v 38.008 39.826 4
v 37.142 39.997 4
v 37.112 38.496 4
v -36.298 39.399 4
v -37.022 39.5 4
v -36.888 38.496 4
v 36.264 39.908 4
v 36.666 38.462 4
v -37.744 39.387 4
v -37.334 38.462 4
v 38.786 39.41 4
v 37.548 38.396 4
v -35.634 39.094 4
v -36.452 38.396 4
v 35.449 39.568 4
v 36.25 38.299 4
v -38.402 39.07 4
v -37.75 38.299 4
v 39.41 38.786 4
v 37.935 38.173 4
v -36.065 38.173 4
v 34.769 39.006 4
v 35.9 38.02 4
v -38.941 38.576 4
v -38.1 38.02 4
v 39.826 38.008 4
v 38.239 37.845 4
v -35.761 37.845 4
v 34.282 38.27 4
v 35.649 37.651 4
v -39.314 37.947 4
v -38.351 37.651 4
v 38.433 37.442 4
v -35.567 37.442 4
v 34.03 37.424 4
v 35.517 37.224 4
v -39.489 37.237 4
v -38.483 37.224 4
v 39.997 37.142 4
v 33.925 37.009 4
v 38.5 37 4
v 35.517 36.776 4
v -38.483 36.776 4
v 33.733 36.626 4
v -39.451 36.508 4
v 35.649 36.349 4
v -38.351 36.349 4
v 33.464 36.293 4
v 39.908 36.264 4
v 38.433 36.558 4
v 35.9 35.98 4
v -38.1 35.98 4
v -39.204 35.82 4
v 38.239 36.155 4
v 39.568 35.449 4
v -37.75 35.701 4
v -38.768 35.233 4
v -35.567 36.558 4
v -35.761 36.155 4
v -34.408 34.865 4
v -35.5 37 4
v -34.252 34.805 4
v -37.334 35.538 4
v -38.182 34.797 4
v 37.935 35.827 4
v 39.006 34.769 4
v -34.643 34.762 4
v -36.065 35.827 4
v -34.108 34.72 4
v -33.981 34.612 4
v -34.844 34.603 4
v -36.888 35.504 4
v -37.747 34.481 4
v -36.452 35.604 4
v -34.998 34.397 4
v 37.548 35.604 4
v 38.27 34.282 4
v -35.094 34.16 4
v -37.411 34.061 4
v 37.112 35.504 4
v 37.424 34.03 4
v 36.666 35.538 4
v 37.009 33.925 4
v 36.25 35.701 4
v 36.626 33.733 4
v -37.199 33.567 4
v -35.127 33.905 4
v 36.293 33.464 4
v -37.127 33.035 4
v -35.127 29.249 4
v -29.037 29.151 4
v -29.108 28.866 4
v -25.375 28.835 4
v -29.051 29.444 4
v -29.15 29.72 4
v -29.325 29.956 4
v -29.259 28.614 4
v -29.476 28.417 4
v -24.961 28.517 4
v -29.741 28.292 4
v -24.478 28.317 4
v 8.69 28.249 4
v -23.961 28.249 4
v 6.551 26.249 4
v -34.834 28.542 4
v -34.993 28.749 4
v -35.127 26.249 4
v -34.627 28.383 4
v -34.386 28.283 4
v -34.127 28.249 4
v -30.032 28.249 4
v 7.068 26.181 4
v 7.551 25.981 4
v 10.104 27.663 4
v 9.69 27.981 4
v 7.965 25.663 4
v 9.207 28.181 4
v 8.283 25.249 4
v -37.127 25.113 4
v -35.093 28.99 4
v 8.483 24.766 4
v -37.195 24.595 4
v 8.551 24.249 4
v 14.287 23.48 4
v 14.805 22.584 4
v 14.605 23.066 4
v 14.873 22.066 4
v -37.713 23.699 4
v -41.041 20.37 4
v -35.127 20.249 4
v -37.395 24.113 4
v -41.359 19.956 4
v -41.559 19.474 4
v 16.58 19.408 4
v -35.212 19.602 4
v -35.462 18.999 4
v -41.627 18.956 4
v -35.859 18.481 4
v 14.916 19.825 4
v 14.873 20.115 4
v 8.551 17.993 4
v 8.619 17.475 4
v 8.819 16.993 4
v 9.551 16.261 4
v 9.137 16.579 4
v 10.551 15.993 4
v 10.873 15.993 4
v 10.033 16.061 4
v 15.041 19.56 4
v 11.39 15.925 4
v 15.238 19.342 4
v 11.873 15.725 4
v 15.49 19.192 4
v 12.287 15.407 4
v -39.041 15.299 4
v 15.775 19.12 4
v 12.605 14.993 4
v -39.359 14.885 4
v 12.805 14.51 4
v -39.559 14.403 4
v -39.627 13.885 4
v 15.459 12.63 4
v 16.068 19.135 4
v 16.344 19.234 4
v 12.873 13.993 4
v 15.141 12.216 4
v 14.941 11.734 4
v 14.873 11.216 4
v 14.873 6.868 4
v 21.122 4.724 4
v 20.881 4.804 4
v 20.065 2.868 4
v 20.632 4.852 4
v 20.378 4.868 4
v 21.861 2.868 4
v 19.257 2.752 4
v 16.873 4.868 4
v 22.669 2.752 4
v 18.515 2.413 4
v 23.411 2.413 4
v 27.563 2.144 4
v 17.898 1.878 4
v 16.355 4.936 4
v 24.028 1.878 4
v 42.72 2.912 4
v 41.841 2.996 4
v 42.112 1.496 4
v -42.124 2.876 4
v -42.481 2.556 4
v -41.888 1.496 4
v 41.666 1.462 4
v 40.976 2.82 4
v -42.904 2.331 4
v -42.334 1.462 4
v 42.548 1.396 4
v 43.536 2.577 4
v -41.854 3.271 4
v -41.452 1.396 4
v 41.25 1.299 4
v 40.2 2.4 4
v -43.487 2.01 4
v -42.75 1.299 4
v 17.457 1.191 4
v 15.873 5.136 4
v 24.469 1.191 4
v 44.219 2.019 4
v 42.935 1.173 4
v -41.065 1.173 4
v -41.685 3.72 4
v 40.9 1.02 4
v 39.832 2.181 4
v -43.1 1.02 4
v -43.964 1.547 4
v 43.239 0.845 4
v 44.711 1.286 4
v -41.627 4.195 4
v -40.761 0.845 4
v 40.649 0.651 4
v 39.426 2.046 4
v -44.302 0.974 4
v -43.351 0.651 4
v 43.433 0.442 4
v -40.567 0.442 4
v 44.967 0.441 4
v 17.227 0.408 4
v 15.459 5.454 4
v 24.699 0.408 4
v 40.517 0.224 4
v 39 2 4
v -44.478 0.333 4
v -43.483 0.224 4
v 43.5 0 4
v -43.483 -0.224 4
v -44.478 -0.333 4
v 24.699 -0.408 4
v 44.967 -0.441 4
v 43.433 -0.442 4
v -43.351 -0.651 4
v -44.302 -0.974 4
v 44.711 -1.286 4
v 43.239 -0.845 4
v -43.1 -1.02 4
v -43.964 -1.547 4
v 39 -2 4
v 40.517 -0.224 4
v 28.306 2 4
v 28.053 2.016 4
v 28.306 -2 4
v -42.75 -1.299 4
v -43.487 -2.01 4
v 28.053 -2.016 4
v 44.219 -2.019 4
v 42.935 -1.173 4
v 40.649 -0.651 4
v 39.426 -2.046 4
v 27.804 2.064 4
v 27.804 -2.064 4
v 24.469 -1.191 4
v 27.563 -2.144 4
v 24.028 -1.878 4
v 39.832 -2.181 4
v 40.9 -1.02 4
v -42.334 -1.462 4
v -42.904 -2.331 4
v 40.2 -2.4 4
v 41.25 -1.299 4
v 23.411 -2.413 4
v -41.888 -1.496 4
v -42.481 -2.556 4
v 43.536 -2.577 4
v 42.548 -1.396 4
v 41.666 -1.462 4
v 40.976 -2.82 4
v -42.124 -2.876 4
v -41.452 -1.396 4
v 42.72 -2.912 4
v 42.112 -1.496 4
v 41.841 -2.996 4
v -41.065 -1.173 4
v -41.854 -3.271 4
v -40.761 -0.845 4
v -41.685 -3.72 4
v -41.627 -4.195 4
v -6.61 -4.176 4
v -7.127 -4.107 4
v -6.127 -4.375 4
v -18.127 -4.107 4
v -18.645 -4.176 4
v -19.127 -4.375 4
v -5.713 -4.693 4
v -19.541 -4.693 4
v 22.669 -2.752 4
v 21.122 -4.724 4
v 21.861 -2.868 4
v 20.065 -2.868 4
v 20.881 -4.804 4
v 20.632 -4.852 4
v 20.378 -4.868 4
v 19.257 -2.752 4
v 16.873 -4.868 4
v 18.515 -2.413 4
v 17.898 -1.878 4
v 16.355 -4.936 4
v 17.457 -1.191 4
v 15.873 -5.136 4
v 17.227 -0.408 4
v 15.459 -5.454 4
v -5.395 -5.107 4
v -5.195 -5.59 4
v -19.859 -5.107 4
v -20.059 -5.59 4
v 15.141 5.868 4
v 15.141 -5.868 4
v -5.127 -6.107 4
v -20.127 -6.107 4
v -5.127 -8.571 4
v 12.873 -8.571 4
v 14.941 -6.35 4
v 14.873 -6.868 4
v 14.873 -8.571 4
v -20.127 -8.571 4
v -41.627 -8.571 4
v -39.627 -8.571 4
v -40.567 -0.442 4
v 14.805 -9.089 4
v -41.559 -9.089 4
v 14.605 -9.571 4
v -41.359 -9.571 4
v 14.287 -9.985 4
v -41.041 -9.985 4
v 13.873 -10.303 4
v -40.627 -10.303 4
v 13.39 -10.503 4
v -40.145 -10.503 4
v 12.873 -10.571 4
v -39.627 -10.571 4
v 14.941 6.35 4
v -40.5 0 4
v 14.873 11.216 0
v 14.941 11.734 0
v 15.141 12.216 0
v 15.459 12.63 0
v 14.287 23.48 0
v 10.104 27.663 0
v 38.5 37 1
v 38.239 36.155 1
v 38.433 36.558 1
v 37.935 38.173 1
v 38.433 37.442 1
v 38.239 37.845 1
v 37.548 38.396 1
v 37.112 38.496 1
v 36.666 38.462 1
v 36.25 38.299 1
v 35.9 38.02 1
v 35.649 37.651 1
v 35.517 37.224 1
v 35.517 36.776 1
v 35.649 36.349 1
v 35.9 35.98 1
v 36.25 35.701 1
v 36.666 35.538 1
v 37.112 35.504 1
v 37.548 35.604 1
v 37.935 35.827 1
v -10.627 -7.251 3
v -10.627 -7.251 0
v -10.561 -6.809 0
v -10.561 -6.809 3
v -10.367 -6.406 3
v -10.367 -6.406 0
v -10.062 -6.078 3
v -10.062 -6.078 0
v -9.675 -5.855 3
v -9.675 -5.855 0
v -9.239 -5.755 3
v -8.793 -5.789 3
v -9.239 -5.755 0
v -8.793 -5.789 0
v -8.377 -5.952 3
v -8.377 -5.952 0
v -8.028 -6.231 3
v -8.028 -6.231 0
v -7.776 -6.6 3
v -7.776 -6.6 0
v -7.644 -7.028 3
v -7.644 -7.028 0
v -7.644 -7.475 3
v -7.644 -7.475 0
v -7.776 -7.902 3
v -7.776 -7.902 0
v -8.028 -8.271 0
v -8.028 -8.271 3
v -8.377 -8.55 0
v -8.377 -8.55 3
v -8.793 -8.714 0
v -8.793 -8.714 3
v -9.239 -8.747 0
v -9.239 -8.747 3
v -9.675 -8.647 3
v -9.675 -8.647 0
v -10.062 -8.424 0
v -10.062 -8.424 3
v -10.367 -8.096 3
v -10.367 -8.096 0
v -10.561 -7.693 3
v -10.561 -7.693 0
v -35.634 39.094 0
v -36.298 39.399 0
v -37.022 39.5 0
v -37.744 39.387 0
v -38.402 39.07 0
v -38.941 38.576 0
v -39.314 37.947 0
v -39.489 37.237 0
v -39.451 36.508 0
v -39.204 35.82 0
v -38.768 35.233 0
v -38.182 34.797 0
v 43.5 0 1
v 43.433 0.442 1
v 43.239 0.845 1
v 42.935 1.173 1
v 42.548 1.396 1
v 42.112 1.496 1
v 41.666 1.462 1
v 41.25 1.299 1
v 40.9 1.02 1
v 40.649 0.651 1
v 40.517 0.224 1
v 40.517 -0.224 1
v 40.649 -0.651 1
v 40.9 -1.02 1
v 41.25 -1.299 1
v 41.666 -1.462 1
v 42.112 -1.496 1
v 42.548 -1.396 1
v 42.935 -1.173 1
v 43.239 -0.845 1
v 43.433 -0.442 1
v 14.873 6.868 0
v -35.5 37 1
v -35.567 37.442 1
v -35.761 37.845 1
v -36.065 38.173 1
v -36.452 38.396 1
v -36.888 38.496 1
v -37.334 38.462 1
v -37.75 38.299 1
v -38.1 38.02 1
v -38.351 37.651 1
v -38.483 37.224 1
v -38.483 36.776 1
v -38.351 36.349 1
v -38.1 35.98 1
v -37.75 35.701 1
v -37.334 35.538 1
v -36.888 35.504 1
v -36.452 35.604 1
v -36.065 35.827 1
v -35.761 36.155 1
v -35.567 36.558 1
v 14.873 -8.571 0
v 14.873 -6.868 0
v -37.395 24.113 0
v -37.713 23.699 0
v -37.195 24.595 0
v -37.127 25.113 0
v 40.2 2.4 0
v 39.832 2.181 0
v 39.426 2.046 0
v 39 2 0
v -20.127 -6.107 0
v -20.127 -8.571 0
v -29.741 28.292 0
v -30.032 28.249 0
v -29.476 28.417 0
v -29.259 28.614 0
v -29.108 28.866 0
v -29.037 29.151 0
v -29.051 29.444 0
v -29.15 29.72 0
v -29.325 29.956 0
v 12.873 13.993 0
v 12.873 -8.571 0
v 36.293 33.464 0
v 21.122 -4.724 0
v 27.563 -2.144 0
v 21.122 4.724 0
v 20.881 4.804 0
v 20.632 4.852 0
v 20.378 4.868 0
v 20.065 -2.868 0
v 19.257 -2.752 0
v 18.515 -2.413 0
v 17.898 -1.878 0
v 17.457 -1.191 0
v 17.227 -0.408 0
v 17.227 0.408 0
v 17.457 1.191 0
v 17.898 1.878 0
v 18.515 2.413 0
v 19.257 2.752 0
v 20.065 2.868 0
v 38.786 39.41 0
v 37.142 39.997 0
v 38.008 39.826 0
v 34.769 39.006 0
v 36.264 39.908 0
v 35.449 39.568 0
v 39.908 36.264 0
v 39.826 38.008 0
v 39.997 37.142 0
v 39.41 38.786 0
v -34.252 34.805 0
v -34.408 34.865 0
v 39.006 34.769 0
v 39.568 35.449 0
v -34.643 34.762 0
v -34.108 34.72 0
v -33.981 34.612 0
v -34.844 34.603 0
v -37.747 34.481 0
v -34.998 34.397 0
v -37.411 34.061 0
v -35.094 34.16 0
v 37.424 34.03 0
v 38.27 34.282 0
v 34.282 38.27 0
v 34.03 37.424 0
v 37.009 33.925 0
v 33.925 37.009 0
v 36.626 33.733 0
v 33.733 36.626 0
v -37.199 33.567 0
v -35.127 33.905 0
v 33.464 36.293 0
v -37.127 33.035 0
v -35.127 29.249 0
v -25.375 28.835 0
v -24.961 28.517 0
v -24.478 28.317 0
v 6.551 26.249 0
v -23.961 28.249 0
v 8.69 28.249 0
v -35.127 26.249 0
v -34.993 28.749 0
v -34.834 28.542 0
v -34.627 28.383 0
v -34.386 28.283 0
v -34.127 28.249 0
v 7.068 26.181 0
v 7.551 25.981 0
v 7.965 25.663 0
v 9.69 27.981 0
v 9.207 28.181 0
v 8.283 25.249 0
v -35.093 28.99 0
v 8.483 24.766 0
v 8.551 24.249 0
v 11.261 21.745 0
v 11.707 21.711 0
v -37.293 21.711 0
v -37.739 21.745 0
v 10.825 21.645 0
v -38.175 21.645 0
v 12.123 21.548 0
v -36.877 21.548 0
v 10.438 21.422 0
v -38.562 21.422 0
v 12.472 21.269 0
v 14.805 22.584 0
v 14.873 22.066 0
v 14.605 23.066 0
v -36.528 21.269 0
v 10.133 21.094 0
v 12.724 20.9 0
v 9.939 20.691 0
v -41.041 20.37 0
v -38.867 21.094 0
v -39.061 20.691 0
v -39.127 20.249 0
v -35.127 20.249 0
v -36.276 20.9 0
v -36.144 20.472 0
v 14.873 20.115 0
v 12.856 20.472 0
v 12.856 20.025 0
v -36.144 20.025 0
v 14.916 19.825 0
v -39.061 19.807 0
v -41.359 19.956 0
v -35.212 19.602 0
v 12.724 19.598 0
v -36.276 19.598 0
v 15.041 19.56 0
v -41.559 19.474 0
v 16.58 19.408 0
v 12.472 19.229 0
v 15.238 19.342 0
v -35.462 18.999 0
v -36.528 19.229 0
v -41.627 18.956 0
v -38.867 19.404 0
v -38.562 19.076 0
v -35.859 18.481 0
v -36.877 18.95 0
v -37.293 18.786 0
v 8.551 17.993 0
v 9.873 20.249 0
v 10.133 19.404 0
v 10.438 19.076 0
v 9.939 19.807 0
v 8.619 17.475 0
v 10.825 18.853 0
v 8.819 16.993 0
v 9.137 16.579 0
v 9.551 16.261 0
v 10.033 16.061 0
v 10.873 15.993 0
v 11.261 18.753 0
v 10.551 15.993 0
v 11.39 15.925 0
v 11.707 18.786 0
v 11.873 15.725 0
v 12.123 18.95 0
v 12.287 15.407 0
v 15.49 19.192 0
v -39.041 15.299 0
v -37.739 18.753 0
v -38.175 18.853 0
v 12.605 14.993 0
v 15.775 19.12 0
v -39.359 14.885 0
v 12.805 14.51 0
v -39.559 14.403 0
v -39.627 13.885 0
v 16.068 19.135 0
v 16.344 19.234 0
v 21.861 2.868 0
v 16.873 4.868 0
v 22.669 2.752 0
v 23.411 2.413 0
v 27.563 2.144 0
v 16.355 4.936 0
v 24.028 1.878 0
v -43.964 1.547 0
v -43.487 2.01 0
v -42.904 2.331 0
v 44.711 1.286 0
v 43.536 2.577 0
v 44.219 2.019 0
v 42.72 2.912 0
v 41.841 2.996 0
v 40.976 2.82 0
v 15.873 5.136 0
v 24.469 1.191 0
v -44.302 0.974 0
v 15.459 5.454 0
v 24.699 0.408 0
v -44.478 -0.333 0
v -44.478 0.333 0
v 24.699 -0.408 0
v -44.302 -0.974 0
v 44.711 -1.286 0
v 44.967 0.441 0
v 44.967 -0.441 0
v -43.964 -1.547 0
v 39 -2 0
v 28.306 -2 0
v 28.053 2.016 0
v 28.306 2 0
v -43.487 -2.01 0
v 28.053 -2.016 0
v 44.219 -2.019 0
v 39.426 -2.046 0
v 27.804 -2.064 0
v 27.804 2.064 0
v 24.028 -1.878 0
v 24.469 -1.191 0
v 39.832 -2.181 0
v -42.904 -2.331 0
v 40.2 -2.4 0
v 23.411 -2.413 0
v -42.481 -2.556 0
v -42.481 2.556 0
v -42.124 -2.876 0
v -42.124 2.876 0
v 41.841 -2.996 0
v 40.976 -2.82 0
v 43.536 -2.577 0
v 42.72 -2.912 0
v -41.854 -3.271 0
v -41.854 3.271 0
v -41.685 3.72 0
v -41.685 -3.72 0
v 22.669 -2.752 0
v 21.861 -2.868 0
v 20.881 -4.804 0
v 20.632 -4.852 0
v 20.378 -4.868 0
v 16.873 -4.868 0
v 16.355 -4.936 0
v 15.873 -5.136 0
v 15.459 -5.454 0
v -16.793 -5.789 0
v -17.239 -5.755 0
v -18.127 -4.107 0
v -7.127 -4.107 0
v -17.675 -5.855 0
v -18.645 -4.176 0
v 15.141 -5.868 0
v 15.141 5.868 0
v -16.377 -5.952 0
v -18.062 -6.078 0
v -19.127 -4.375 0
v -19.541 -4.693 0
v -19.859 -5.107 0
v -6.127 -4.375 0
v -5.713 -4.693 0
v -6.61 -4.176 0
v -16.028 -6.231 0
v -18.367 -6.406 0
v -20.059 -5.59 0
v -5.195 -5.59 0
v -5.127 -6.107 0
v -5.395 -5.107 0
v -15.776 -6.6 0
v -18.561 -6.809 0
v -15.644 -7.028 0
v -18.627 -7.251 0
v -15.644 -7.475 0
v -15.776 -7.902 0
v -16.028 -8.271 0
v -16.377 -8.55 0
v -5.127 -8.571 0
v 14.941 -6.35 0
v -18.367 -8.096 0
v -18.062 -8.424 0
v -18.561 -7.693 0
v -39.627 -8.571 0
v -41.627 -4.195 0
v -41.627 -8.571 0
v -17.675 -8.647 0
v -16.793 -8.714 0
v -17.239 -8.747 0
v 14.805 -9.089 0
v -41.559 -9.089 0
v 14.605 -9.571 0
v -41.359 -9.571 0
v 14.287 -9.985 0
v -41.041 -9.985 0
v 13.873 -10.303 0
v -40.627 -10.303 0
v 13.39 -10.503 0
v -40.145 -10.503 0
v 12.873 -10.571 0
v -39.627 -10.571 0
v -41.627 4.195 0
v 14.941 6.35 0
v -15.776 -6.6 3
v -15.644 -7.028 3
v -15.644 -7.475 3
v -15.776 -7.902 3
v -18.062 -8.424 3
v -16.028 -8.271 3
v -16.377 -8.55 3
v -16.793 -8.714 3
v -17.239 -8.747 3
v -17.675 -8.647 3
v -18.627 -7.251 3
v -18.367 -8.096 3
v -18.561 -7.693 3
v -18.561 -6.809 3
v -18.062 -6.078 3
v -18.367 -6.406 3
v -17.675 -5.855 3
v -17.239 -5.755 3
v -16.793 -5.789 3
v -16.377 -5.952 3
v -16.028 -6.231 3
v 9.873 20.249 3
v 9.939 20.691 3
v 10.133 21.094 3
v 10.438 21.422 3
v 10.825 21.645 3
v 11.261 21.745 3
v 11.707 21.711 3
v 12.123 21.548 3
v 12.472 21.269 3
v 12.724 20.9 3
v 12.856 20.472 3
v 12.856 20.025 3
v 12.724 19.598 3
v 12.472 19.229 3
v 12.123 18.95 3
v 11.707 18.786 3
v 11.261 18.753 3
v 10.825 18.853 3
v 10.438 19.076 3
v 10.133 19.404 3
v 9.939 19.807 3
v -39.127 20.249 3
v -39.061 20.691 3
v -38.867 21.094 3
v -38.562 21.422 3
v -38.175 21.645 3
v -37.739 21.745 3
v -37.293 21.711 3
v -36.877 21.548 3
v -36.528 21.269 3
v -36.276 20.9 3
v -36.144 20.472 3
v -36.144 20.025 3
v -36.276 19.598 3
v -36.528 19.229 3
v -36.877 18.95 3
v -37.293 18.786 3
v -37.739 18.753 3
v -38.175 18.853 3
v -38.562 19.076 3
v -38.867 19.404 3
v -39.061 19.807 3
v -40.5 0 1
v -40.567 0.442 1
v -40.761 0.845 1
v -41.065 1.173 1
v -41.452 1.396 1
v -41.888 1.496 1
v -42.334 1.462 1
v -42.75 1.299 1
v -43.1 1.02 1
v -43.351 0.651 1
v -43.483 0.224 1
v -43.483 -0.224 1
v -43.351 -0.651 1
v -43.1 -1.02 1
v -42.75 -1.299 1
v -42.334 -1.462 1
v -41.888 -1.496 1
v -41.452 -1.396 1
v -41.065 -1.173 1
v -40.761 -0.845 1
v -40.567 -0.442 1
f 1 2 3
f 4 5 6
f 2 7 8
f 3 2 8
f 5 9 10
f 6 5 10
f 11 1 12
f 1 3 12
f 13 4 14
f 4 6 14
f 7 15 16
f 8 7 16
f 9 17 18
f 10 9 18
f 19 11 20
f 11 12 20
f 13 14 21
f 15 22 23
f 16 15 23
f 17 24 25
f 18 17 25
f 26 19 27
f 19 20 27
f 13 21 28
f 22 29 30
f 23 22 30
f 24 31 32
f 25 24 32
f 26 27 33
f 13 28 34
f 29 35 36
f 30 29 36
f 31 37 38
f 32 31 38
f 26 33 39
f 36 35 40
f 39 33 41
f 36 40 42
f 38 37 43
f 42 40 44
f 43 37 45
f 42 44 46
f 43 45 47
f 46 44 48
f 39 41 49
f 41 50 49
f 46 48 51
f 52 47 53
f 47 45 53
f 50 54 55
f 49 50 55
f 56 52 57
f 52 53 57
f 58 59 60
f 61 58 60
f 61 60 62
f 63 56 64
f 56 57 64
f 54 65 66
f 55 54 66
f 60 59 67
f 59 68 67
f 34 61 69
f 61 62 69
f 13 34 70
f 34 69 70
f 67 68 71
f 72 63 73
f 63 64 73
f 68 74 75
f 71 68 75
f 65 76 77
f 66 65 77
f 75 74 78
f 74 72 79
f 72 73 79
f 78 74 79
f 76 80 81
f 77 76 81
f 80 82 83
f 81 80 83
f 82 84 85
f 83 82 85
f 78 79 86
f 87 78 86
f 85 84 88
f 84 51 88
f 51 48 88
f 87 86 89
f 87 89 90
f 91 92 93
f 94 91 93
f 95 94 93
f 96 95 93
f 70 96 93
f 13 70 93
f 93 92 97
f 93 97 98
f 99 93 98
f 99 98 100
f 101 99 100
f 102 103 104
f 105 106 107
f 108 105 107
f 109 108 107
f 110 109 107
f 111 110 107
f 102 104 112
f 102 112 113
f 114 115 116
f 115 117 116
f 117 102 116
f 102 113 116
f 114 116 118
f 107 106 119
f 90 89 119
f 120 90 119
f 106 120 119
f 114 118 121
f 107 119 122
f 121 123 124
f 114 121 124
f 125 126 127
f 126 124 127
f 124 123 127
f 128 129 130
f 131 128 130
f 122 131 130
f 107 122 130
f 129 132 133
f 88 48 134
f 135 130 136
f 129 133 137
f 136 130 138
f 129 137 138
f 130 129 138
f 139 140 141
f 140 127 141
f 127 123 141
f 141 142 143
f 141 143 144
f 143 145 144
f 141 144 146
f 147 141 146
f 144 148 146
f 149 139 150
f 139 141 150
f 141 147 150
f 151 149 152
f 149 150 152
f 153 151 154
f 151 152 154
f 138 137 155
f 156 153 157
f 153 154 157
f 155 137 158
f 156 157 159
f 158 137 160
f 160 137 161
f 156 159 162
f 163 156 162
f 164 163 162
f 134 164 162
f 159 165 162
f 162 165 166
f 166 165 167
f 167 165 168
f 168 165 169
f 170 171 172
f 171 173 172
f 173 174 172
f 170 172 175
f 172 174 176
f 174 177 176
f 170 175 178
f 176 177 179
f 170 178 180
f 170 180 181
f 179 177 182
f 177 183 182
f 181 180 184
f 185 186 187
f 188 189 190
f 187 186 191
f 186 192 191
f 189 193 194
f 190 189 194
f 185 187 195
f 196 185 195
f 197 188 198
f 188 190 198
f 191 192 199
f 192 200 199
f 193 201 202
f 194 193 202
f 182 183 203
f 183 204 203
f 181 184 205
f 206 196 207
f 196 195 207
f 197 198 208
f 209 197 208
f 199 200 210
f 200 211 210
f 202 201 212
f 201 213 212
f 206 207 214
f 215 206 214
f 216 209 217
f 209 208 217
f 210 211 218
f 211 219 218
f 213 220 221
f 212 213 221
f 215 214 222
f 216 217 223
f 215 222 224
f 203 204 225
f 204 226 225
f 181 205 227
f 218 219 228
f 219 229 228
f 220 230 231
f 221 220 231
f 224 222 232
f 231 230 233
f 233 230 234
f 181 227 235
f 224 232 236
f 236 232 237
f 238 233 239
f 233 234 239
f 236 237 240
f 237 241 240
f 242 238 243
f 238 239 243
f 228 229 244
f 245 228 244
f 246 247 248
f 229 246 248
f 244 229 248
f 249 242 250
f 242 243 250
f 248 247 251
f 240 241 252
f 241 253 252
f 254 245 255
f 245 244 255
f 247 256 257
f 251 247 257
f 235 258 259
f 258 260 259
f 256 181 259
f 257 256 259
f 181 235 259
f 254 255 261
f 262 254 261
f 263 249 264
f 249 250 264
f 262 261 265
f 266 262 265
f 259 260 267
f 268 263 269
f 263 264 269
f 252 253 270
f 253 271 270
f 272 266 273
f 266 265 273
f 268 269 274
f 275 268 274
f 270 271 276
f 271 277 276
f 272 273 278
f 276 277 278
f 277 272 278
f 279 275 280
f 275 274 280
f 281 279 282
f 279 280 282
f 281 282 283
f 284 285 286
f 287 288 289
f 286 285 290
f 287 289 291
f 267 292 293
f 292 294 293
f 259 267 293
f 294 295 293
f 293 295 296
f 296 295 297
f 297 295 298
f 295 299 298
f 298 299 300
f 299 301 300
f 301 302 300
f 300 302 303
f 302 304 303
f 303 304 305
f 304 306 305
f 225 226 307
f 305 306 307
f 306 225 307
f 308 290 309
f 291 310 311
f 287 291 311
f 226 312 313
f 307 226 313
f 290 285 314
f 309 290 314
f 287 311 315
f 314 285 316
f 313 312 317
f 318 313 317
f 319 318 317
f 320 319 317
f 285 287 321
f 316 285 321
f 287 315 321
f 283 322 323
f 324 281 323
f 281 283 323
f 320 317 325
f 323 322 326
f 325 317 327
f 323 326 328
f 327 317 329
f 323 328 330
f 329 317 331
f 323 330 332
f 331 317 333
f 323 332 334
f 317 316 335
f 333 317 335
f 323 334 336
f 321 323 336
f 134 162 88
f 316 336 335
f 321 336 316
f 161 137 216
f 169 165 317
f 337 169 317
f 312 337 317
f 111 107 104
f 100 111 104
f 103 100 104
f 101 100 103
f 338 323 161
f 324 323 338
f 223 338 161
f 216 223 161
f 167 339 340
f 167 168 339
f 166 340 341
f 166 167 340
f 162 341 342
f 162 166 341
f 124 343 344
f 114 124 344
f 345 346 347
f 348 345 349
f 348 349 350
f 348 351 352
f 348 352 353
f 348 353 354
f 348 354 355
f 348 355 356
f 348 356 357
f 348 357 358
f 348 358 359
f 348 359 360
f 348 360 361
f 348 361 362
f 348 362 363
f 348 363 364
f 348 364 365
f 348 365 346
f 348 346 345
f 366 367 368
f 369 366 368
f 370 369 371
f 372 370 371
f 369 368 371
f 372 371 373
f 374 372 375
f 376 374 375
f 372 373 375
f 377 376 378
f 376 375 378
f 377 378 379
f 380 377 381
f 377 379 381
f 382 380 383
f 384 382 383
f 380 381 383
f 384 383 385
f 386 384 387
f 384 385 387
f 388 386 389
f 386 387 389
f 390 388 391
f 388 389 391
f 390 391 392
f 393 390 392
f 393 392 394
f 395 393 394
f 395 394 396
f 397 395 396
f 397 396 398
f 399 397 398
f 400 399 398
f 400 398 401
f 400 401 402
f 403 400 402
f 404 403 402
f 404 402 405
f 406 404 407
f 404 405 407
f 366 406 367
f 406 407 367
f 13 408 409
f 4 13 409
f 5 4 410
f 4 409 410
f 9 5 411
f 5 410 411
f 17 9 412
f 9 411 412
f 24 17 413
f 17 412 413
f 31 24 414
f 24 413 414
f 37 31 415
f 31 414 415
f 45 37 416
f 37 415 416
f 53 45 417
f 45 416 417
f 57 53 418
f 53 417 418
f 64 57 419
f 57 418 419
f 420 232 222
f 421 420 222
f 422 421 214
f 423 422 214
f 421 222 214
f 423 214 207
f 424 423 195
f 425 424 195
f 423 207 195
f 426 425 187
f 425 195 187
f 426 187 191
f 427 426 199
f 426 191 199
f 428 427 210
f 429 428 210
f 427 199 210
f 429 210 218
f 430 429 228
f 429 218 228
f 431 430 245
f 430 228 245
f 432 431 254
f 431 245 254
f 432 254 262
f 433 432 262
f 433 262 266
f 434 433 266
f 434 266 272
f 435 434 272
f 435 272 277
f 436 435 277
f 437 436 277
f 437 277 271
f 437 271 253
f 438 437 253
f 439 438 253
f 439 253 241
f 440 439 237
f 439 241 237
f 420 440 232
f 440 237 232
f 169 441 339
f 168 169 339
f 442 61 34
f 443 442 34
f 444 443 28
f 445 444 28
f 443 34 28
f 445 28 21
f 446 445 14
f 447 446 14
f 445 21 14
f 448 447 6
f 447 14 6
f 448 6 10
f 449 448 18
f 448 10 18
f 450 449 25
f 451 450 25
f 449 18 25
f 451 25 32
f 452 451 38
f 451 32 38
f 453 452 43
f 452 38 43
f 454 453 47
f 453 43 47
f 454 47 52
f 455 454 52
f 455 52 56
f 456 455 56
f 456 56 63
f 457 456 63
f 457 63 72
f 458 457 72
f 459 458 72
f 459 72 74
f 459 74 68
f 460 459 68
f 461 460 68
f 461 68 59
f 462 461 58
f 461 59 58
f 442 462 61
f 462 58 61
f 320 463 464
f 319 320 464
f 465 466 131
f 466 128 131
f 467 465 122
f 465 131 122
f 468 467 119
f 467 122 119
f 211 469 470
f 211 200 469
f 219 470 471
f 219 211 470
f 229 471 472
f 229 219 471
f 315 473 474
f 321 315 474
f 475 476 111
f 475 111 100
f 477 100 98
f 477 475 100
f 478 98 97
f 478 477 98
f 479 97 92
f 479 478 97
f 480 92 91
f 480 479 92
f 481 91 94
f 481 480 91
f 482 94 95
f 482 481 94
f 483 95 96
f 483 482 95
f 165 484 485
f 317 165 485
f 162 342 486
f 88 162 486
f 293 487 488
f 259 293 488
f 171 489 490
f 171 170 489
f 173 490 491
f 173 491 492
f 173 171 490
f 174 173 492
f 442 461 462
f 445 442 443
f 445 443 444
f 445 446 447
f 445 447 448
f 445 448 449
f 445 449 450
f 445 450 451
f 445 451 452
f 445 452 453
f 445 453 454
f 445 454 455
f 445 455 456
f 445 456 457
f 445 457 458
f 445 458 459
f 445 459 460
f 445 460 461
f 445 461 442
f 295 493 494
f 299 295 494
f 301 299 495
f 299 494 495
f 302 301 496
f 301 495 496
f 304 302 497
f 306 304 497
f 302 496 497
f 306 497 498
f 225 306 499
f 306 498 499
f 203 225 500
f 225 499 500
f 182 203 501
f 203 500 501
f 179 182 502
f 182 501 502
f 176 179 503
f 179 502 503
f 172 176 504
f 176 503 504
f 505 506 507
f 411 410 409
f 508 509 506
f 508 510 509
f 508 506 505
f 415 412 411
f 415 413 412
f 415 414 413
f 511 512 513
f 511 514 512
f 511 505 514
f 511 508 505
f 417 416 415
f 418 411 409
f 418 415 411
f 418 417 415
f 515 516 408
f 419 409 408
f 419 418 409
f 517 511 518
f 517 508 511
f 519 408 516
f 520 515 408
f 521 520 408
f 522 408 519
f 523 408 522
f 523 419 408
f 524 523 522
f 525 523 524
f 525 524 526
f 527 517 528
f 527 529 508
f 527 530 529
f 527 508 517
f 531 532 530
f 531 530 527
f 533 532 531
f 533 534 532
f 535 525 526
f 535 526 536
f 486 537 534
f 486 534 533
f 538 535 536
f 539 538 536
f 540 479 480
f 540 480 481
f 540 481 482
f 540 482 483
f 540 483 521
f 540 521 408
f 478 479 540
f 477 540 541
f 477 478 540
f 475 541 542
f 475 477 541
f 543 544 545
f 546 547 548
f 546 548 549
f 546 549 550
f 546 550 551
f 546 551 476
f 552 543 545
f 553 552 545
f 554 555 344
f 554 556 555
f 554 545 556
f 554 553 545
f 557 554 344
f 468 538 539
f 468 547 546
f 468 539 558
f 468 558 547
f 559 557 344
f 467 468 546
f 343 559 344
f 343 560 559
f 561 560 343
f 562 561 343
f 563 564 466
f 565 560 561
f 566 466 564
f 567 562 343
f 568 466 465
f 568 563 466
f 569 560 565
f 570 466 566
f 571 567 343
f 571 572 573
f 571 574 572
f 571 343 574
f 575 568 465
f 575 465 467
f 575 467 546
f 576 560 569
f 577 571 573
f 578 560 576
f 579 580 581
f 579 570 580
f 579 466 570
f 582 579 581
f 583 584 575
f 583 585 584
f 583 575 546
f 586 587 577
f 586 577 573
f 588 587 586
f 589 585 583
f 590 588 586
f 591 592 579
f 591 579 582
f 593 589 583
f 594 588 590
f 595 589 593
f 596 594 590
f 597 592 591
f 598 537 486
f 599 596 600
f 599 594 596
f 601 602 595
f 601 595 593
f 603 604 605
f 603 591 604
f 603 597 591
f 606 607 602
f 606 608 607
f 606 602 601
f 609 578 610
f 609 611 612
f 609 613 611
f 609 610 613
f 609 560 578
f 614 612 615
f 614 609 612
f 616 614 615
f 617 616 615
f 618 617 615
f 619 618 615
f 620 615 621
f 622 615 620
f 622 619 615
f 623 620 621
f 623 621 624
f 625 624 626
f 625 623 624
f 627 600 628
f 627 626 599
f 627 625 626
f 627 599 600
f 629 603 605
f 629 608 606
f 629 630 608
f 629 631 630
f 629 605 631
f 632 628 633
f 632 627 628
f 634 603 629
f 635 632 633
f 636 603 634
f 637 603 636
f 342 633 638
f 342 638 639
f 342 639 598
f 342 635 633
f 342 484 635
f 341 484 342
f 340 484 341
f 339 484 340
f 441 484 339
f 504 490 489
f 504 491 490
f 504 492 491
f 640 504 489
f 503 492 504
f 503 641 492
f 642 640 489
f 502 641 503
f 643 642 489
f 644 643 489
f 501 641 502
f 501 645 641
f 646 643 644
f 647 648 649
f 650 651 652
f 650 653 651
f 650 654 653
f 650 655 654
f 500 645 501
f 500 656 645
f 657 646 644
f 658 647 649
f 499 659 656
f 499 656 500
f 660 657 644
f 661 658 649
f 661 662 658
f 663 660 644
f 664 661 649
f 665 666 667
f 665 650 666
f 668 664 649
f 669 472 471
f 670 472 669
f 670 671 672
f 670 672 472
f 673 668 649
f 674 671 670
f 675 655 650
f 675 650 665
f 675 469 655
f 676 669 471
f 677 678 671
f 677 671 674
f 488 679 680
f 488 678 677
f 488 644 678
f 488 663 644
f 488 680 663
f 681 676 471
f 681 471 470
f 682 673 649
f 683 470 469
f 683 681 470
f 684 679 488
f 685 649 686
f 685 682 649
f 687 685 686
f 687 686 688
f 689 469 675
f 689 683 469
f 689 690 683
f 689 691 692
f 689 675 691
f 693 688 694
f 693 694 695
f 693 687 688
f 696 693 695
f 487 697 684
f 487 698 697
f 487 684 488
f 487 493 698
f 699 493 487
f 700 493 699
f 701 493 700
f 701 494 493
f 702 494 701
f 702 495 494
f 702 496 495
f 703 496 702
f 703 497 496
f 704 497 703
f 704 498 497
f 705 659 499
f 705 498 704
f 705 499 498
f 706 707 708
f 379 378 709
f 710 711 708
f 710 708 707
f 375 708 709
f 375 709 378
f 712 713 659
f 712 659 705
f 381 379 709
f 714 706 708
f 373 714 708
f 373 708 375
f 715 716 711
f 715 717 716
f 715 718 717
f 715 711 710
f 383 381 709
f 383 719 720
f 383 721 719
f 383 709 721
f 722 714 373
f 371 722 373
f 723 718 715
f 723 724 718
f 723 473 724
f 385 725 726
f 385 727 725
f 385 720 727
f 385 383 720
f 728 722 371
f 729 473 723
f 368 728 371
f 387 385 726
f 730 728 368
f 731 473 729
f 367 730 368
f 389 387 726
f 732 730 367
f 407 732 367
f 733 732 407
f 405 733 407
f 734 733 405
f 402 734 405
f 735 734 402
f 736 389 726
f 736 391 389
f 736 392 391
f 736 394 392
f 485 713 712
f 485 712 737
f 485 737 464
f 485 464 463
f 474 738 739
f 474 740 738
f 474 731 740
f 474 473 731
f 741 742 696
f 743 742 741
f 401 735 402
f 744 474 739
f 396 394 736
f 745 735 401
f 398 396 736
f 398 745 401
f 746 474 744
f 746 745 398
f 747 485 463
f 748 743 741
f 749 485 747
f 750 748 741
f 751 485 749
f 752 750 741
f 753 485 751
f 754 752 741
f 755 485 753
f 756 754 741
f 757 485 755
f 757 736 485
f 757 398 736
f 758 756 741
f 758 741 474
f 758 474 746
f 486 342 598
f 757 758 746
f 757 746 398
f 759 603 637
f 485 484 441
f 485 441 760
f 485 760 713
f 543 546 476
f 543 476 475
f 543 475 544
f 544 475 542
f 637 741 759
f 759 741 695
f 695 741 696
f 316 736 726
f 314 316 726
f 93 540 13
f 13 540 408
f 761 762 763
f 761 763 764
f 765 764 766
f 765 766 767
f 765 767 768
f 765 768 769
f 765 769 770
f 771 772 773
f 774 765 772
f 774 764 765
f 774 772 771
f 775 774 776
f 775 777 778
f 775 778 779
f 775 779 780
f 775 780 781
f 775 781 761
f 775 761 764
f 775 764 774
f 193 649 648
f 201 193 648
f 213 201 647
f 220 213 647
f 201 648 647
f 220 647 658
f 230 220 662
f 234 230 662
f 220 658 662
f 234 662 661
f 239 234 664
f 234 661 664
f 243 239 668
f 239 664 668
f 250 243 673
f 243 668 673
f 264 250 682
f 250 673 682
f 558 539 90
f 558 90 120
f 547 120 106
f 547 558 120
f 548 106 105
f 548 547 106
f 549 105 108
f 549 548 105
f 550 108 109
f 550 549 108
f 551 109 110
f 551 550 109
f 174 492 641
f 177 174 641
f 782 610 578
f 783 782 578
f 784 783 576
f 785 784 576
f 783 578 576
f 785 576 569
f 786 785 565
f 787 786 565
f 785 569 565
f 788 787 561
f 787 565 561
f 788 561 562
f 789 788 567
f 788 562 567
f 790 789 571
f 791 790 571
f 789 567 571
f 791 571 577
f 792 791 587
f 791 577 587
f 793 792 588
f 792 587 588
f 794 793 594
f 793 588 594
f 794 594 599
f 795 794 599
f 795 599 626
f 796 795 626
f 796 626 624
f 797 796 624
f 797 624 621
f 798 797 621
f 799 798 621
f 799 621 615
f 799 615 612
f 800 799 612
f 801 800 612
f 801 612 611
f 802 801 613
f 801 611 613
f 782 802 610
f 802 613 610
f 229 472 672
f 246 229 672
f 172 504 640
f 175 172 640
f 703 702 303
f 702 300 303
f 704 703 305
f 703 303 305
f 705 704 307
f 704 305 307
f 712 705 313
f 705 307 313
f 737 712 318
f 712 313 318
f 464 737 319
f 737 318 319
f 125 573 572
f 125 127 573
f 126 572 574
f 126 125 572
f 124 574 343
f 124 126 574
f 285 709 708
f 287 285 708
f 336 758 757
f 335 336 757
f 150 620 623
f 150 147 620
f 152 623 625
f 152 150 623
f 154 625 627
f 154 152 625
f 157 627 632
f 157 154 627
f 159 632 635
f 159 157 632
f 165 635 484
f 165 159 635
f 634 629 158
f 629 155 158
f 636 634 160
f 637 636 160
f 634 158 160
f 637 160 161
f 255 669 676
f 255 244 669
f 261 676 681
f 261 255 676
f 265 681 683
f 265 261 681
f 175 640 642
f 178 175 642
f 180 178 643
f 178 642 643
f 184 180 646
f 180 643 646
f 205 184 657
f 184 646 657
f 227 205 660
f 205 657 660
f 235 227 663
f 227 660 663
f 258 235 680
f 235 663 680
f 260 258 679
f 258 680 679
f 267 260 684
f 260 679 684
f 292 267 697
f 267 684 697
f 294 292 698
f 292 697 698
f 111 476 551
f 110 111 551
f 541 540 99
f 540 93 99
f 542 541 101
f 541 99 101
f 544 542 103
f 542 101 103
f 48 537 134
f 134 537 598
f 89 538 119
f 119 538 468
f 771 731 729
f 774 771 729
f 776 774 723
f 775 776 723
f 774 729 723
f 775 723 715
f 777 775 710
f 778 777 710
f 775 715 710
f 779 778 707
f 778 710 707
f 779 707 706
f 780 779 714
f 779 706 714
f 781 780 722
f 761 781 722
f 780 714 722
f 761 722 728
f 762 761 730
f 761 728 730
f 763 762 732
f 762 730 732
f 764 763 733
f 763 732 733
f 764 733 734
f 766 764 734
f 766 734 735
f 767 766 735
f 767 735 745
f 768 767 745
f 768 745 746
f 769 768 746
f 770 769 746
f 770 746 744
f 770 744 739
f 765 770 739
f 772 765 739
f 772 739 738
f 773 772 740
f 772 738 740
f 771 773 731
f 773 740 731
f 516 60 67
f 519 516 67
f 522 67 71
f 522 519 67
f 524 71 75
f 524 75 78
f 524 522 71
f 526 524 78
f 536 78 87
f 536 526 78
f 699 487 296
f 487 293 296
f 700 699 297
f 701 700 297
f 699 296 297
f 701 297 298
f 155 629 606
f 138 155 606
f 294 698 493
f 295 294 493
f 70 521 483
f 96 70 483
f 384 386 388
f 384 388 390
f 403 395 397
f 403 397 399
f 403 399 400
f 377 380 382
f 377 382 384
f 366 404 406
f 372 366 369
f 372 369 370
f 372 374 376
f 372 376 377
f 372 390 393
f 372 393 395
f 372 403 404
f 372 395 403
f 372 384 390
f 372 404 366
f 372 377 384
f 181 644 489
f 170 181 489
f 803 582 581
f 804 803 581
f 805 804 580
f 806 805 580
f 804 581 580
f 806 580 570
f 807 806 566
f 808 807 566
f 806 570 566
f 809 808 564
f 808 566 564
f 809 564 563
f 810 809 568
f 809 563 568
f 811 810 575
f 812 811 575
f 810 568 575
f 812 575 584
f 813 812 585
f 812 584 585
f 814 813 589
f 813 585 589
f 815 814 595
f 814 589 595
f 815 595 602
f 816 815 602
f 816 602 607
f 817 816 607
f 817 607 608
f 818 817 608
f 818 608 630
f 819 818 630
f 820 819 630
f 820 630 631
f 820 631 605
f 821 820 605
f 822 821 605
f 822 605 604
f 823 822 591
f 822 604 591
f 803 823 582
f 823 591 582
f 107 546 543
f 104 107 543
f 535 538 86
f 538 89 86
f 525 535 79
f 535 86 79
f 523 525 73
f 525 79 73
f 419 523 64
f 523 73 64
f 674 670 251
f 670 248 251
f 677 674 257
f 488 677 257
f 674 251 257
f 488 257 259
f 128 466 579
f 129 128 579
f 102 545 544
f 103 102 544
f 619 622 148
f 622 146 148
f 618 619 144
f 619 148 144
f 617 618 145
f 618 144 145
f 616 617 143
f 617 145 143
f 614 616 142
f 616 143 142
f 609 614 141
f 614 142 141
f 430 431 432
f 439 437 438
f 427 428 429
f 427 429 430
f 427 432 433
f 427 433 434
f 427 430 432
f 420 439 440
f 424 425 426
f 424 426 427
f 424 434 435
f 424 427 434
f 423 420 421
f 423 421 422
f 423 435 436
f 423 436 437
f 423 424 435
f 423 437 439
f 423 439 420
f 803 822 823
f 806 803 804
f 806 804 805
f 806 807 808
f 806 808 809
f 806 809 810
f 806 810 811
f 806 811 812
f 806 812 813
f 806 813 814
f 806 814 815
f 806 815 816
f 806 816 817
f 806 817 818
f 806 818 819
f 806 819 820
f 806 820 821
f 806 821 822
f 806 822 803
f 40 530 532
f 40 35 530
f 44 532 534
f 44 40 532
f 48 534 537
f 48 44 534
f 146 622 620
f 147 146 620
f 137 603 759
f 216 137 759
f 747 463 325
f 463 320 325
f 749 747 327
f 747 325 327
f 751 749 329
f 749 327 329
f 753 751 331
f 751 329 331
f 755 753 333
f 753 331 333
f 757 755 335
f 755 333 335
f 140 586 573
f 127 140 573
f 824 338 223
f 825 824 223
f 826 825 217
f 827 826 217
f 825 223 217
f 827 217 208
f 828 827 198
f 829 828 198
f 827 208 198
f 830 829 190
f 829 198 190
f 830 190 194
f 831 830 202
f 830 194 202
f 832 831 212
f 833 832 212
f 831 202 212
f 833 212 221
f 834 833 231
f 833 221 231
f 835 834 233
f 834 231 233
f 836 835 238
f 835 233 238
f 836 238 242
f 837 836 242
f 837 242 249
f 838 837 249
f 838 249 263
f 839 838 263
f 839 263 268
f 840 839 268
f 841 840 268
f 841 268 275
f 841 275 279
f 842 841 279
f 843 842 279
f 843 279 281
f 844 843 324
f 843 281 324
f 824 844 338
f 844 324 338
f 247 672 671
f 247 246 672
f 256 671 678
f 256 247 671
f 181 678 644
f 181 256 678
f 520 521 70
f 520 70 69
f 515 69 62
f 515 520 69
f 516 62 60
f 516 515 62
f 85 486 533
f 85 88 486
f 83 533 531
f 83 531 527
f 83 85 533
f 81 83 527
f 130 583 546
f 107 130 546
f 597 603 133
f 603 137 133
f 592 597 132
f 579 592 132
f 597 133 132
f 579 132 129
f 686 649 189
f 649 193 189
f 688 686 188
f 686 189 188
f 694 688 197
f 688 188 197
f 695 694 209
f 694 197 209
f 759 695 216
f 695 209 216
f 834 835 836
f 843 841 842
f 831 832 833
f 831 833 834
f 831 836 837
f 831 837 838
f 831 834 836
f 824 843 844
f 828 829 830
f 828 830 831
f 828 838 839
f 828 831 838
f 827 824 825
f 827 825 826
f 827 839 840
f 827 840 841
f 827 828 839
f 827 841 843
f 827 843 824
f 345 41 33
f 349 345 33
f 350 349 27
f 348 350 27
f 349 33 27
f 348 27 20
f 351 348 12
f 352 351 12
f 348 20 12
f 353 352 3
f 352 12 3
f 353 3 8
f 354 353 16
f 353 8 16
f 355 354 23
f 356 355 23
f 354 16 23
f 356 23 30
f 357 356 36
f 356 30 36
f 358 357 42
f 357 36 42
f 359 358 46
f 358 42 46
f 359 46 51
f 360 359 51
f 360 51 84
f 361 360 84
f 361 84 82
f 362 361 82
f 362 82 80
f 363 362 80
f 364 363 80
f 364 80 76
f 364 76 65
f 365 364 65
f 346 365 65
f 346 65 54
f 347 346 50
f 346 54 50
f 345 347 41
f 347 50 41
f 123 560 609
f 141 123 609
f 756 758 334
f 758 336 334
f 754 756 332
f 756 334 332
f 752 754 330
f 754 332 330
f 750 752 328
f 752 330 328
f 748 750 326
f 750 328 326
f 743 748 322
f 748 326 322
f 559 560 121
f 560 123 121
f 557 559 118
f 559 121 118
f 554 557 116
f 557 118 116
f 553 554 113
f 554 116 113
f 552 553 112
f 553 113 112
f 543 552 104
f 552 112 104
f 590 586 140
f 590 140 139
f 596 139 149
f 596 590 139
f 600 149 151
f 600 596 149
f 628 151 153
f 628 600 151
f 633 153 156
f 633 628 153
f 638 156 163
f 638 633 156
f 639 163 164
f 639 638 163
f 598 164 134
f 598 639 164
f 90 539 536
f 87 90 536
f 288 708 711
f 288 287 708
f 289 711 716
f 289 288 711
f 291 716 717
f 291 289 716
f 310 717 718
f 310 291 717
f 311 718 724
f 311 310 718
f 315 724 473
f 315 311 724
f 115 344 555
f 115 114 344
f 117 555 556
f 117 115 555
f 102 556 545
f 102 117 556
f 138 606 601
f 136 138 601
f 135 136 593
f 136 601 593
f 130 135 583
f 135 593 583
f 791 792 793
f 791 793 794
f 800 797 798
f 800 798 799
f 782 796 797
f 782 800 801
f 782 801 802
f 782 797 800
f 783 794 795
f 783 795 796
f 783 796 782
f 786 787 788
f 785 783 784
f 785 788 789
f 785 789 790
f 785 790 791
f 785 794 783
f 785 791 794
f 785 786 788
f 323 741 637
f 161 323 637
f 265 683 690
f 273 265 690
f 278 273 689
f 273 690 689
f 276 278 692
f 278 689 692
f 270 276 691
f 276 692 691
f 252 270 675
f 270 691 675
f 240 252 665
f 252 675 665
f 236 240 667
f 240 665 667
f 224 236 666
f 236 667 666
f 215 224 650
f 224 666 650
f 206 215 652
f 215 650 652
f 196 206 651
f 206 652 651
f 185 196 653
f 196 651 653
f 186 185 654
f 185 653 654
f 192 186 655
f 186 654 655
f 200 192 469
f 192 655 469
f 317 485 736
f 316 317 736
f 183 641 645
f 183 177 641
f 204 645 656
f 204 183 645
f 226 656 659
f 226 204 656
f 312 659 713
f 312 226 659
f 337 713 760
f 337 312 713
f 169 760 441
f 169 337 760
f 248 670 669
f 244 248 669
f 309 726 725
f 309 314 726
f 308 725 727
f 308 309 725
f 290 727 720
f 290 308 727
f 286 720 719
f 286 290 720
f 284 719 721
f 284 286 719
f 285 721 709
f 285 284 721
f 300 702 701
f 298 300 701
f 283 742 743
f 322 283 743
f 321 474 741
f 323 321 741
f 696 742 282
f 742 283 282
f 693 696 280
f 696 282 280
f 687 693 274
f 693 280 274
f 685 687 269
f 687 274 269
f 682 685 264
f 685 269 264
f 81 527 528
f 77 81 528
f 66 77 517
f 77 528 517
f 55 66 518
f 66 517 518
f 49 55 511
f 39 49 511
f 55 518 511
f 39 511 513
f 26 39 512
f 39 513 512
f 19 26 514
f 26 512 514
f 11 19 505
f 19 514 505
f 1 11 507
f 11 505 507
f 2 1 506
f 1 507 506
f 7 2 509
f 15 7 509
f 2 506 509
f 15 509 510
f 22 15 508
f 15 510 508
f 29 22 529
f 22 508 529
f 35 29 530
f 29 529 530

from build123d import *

# Parameters (mm, degrees)
BOSS_EXTRUDE1_DEPTH = 4
SKETCH5_R           = 1.5
CUT_EXTRUDE1_DEPTH  = 3
SKETCH6_R           = 1.5
CUT_EXTRUDE2_DEPTH  = 3
FILLET1_R           = 2
FILLET2_R           = 1


with BuildPart() as part:
    # Sketch4 → Boss-Extrude1 (new body)
    with BuildSketch(Plane(origin=(0, 0, 0), x_dir=(0, 1, 0), z_dir=(0, 0, 1))):
        with BuildLine():
            Line((-2, -27.920633468), (-2, -39.763932023))
            ThreePointArc((-2, -39.763932023), (0, -45), (2, -39.763932023))
            Line((2, -39.763932023), (2, -27.920633468))
            Line((2, -27.920633468), (4.867831403, -20.764056013))
            Line((4.867831403, -20.764056013), (4.867831403, -14.872797682))
            Line((4.867831403, -14.872797682), (12.044370558, -14.872797682))
            Line((12.044370558, -14.872797682), (34.004647608, -36.833074732))
            ThreePointArc((34.004647608, -36.833074732), (39.121320344, -39.121320344), (36.833074732, -34.004647608))
            Line((36.833074732, -34.004647608), (17.701224807, -14.872797682))
            Line((17.701224807, -14.872797682), (22.894335258, -14.872797682))
            Line((22.894335258, -14.872797682), (28.248854336, -9.518278604))
            Line((28.248854336, -9.518278604), (28.248854336, 24.78907846))
            Line((28.248854336, 24.78907846), (38.365899309, 34.906123433))
            Line((38.365899309, 34.906123433), (39.093876567, 35.634100691))
            ThreePointArc((39.093876567, 35.634100691), (37.77325109, 39.377410935), (34.503238183, 37.127202318))
            Line((34.503238183, 37.127202318), (24.284388241, 37.127202318))
            Line((24.284388241, 37.127202318), (19.784388241, 41.627202318))
            Line((19.784388241, 41.627202318), (2.472048116, 41.627202318))
            ThreePointArc((2.472048116, 41.627202318), (0, 44.5), (-2.472048116, 41.627202318))
            Line((-2.472048116, 41.627202318), (-10.570956119, 41.627202318))
            Line((-10.570956119, 41.627202318), (-10.570956119, -14.872797682))
            Line((-10.570956119, -14.872797682), (-4.867831403, -14.872797682))
            Line((-4.867831403, -14.872797682), (-4.867831403, -20.764056013))
            Line((-4.867831403, -20.764056013), (-2, -27.920633468))
        make_face()
        with BuildLine():
            ThreePointArc((-2.867831403, -20.065196532), (0, -17.197365128), (2.867831403, -20.065196532))
            Line((2.867831403, -20.065196532), (2.867831403, -21.860808403))
            ThreePointArc((2.867831403, -21.860808403), (0, -24.728639806), (-2.867831403, -21.860808403))
            Line((-2.867831403, -21.860808403), (-2.867831403, -20.065196532))
        make_face(mode=Mode.SUBTRACT)
        with BuildLine():
            Line((15.992780239, -12.872797682), (-8.570956119, -12.872797682))
            Line((-8.570956119, -12.872797682), (-8.570956119, 5.127202318))
            Line((-8.570956119, 5.127202318), (-4.107420483, 5.127202318))
            Line((-4.107420483, 5.127202318), (-4.107420483, 20.127202318))
            Line((-4.107420483, 20.127202318), (-8.570956119, 20.127202318))
            Line((-8.570956119, 20.127202318), (-8.570956119, 39.627202318))
            Line((-8.570956119, 39.627202318), (14.71332043, 39.627202318))
            Line((14.71332043, 39.627202318), (18.481087383, 35.859435365))
            ThreePointArc((18.481087383, 35.859435365), (19.292145755, 35.317503486), (20.248854336, 35.127202318))
            Line((20.248854336, 35.127202318), (26.248854336, 35.127202318))
            Line((26.248854336, 35.127202318), (26.248854336, -4.702478507))
            Line((26.248854336, -4.702478507), (26.248854336, -8.550773098))
            Line((26.248854336, -8.550773098), (15.992780239, -8.550773098))
            Line((15.992780239, -8.550773098), (15.992780239, -12.872797682))
        make_face(mode=Mode.SUBTRACT)
        Polygon((34.905300686, 34.273951935), (28.248854336, 27.617505584), (28.248854336, 35.127202318), (34.905300686, 35.127202318), align=None, mode=Mode.SUBTRACT)
    extrude(amount=BOSS_EXTRUDE1_DEPTH)

    # Sketch5 → Cut-Extrude1 (cut)
    with BuildSketch(Plane.XY.offset(4)):
        with Locations((-37, 37)):
            Circle(SKETCH5_R)
        with Locations((-42, 0)):
            Circle(SKETCH5_R)
        with Locations((37, 37)):
            Circle(SKETCH5_R)
        with Locations((42, 0)):
            Circle(SKETCH5_R)
    extrude(amount=-CUT_EXTRUDE1_DEPTH, mode=Mode.SUBTRACT)

    # Sketch6 → Cut-Extrude2 (cut)
    with BuildSketch(Plane(origin=(0, 0, 0), x_dir=(1, 0, 0), z_dir=(0, 0, -1))):
        with Locations(Location((-17.127202318, 7.251145664, 0), (0, 0, 180))):
            Circle(SKETCH6_R)
        with Locations(Location((-9.127202318, 7.251145664, 0), (0, 0, 180))):
            Circle(SKETCH6_R)
        with Locations(Location((11.372797682, -20.248854336, 0), (0, 0, 180))):
            Circle(SKETCH6_R)
        with Locations(Location((-37.627202318, -20.248854336, 0), (0, 0, 180))):
            Circle(SKETCH6_R)
    extrude(amount=-CUT_EXTRUDE2_DEPTH, mode=Mode.SUBTRACT)

    # Fillet1
    fillet1_edges = [part.edges().sort_by_distance(p)[0] for p in [
        (-41.627202318, 19.784388241, 2),
        (-37.127202318, 24.284388241, 2),
        (-37.127202318, 34.503238183, 2),
        (-24.78907846, 28.248854336, 2),
        (9.518278604, 28.248854336, 2),
        (14.872797682, 22.894335258, 2),
        (34.004647608, 36.833074732, 2),
        (36.833074732, 34.004647608, 2),
        (14.872797682, 12.044370558, 2),
        (14.872797682, 4.867831403, 2),
        (20.764056013, 4.867831403, 2),
        (27.920633468, 2, 2),
        (39.763932023, 2, 2),
        (39.763932023, -2, 2),
        (27.920633468, -2, 2),
        (20.764056013, -4.867831403, 2),
        (14.872797682, -4.867831403, 2),
        (14.872797682, -10.570956119, 2),
        (-41.627202318, -10.570956119, 2),
        (-41.627202318, -2.472048116, 2),
        (-41.627202318, 2.472048116, 2),
        (-39.627202318, 14.71332043, 2),
        (-20.127202318, -4.107420483, 2),
        (-5.127202318, -4.107420483, 2),
        (12.872797682, 15.992780239, 2),
        (8.550773098, 15.992780239, 2),
        (8.550773098, 26.248854336, 2),
    ]]
    fillet(fillet1_edges, radius=FILLET1_R)

    # Fillet2
    # the kernel refuses this fillet: 1 mm, written as the material it adds along each edge
    with BuildSketch(Plane(origin=(14.872797682, 17.701224807, 0), x_dir=(0, 1, 0), z_dir=(0, 0, 1))) as fillet2_piece_1:
        with BuildLine():
            CenterArc((FILLET2_R * 2.41421356237, -FILLET2_R), FILLET2_R, 90, 135)
            Line((FILLET2_R * 1.70710678119, -FILLET2_R * 1.70710678119), (0, 0))
            Line((0, 0), (FILLET2_R * 2.41421356237, 0))
        make_face()
    extrude(amount=4)
    with BuildSketch(Plane(origin=(-34.273951935, 34.905300686, 0), x_dir=(0.7071067811865476, -0.7071067811865476, 0), z_dir=(0, 0, 1))) as fillet2_piece_2:
        with BuildLine():
            CenterArc((FILLET2_R * 0.414213562373, -FILLET2_R), FILLET2_R, 90, 45)
            Line((-FILLET2_R * 0.292893218813, -FILLET2_R * 0.292893218814), (0, 0))
            Line((0, 0), (FILLET2_R * 0.414213562373, 0))
        make_face()
    extrude(amount=4)
    with BuildSketch(Plane(origin=(-35.127202318, 34.905300686, 0), x_dir=(1, 0, 0), z_dir=(0, 0, 1))) as fillet2_piece_3:
        with BuildLine():
            CenterArc((FILLET2_R, -FILLET2_R), FILLET2_R, 90, 90)
            Line((0, -FILLET2_R), (0, 0))
            Line((0, 0), (FILLET2_R, 0))
        make_face()
    extrude(amount=4)
    with BuildSketch(Plane(origin=(-35.127202318, 28.248854336, 0), x_dir=(1, 0, 0), z_dir=(0, 0, 1))) as fillet2_piece_4:
        with BuildLine():
            CenterArc((FILLET2_R, FILLET2_R), FILLET2_R, 180, 90)
            Line((0, FILLET2_R), (0, 0))
            Line((0, 0), (FILLET2_R, 0))
        make_face()
    extrude(amount=4)
    with BuildSketch(Plane(origin=(-27.617505584, 28.248854336, 0), x_dir=(-0.7071067811865468, 0.7071067811865482, 0), z_dir=(0, 0, 1))) as fillet2_piece_5:
        with BuildLine():
            CenterArc((FILLET2_R * 2.41421356237, FILLET2_R), FILLET2_R, 135, 135)
            Line((FILLET2_R * 1.70710678119, FILLET2_R * 1.70710678119), (0, 0))
            Line((0, 0), (FILLET2_R * 2.41421356237, 0))
        make_face()
    extrude(amount=4)


solid = part.part
